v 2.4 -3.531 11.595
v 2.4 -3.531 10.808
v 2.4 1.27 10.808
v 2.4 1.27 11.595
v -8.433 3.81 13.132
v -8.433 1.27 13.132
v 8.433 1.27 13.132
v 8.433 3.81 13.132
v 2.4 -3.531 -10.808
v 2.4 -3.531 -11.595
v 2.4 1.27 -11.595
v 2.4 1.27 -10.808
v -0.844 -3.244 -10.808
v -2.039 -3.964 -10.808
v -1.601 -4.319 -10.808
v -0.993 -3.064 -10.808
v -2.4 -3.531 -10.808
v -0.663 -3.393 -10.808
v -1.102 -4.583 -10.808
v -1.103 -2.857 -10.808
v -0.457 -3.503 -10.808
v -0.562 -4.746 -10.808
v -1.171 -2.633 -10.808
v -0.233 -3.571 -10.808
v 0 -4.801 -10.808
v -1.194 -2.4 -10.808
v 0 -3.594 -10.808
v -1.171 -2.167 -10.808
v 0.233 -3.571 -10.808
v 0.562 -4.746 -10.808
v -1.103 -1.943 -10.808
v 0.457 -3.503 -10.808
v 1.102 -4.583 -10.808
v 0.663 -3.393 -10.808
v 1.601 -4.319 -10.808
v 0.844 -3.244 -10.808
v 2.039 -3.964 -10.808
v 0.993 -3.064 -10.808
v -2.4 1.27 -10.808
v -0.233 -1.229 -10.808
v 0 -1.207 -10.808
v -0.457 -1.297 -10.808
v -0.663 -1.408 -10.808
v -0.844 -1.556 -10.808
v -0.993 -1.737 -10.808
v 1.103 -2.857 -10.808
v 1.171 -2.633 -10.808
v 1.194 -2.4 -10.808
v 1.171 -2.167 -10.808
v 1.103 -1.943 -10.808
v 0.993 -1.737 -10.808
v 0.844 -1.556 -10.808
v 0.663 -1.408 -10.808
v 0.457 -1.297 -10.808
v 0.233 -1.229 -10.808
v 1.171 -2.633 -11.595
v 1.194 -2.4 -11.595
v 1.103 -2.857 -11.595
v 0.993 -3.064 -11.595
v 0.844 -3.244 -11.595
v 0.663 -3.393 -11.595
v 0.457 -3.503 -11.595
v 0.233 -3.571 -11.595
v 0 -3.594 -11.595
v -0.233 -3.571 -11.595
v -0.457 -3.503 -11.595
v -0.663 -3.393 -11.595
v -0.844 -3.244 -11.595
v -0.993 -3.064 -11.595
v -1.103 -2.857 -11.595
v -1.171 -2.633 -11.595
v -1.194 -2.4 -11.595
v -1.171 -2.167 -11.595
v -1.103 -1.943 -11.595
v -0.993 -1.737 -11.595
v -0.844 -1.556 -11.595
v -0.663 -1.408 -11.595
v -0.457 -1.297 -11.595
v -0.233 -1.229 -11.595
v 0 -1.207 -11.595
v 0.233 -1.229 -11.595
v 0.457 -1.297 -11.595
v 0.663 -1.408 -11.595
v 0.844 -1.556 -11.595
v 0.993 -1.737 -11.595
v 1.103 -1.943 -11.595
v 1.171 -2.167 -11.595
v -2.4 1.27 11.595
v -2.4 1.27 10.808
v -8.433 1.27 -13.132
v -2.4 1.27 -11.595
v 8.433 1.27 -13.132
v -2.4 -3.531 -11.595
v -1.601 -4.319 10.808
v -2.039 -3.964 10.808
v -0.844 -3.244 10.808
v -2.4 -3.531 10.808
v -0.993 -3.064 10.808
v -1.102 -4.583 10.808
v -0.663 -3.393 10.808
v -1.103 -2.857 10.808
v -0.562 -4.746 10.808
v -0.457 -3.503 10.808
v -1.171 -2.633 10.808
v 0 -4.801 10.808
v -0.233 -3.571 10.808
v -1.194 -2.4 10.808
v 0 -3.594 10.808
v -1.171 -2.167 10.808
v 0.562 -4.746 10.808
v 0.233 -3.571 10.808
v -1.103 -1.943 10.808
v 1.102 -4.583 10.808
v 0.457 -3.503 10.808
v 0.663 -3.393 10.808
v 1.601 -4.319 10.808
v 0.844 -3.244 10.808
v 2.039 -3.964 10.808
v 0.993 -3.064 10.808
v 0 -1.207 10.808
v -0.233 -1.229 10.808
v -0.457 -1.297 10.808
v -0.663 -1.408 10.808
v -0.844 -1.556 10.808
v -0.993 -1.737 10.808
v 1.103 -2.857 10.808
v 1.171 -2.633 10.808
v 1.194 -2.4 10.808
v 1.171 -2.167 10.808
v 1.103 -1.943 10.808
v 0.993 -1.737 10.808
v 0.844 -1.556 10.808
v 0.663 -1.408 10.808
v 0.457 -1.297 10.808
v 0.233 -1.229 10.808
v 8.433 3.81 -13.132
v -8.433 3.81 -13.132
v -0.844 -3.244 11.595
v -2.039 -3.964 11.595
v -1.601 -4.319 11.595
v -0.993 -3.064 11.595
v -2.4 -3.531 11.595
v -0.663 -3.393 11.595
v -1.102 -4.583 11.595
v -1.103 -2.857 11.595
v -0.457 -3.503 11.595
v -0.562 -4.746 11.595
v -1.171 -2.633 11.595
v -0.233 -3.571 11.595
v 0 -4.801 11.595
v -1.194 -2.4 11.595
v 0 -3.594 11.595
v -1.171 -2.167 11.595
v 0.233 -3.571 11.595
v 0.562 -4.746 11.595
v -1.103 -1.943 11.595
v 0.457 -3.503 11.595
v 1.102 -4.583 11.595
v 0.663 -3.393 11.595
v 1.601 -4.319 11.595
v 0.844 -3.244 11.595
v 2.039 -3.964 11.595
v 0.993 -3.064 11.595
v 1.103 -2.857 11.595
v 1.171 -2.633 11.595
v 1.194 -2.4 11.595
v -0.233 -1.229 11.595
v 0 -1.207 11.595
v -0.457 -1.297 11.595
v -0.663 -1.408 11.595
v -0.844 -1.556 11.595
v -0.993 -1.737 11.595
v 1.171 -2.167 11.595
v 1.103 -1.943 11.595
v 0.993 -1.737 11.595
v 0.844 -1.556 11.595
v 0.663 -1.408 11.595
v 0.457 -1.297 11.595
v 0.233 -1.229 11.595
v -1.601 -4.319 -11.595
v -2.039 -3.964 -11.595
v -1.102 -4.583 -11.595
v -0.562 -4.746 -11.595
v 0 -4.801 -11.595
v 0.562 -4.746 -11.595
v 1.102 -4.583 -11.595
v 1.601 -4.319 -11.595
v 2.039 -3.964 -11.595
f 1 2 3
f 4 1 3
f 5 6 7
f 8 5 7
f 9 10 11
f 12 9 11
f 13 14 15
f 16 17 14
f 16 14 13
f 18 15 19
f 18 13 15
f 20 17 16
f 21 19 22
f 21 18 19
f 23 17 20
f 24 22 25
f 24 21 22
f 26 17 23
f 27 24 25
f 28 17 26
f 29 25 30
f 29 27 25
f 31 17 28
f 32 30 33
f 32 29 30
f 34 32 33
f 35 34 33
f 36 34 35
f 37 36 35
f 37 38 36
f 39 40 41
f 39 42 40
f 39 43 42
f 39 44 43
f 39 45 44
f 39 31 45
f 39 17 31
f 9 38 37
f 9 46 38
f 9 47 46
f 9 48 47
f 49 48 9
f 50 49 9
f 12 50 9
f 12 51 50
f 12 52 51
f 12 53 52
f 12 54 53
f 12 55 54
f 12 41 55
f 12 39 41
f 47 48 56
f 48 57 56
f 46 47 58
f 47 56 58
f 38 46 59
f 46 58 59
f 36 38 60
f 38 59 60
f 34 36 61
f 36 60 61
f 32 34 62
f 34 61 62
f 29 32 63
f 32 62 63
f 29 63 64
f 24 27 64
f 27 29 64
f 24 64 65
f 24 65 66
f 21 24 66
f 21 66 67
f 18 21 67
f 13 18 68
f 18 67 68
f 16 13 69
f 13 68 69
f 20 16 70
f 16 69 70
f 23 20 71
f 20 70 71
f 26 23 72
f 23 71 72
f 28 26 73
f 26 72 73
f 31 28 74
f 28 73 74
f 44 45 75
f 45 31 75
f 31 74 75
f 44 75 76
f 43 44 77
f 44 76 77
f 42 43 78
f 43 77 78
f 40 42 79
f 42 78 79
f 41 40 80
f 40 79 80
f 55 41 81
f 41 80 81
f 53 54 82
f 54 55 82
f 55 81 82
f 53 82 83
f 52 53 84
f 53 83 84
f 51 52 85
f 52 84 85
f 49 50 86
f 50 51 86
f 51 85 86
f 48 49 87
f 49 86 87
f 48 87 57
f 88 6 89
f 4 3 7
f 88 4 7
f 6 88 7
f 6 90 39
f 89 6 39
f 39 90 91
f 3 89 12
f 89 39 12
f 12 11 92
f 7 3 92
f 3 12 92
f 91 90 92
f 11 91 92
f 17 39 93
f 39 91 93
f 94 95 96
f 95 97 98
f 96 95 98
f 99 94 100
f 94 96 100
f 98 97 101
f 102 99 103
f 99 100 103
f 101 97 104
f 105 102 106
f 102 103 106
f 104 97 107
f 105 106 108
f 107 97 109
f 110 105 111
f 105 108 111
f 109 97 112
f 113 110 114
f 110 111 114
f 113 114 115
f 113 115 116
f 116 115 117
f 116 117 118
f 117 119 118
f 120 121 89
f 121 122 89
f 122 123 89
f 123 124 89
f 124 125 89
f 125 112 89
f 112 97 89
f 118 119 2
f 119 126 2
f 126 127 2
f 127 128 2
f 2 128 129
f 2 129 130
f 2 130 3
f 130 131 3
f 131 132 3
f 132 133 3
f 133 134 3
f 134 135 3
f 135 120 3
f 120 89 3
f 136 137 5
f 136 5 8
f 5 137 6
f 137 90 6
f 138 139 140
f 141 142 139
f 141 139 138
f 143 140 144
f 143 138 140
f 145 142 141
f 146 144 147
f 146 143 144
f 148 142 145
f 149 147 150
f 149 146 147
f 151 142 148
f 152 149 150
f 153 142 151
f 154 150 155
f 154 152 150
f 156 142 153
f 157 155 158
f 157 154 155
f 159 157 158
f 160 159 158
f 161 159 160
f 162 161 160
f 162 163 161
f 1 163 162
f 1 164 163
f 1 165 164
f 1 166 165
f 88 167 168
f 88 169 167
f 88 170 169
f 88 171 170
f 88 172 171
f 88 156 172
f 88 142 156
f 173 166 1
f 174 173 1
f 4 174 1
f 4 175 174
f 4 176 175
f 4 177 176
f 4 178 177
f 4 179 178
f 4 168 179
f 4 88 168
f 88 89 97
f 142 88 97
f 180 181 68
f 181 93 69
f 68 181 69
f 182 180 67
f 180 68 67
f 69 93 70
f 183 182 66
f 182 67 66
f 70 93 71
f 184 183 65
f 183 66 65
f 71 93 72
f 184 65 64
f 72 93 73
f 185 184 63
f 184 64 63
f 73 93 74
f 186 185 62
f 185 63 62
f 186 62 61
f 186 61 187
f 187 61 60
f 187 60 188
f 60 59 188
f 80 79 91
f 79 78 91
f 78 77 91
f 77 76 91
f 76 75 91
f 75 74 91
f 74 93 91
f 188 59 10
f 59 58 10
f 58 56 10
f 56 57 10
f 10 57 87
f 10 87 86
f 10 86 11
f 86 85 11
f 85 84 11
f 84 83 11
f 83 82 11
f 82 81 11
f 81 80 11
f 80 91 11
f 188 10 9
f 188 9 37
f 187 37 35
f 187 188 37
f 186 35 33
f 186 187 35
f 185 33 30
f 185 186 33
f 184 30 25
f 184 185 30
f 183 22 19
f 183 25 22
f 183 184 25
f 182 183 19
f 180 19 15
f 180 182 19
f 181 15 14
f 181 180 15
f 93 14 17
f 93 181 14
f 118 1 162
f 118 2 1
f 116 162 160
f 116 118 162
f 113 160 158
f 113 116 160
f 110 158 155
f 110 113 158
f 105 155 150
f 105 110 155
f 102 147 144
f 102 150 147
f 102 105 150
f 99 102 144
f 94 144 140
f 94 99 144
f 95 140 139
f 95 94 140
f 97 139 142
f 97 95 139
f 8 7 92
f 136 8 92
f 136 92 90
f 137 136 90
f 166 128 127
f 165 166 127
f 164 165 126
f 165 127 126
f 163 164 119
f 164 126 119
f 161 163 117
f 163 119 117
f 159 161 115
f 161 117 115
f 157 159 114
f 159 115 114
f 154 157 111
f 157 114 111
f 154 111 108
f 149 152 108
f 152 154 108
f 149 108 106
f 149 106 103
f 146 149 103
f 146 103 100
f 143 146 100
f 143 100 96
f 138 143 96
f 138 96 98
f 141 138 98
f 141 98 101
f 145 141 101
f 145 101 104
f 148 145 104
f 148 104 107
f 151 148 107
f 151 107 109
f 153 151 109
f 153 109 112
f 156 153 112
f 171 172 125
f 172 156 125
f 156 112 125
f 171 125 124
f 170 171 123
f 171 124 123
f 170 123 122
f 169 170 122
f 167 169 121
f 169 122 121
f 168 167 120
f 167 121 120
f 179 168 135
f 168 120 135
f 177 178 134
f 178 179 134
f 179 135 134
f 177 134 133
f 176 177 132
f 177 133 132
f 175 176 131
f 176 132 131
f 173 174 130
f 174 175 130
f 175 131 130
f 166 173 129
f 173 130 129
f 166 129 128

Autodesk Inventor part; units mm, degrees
sketch "Sketch_2" plane through (0, 1.27, 0) normal (0, 1, 0) x (1, 0, 0)
  line L0 (-8.4328, -13.1318) -> (8.4328, -13.1318)
  line L1 (8.4328, -13.1318) -> (8.4328, 13.1318)
  line L2 (8.4328, 13.1318) -> (-8.4328, 13.1318)
  line L3 (-8.4328, 13.1318) -> (-8.4328, -13.1318)
extrude "Extrusion1" add sketch "Sketch_2" along normal blind 2.54
sketch "Sketch_1" plane through (0, 0, -11.2014) normal (0, 0, 1) x (1, 0, 0)
  line L0 (-2.4003, 1.27) -> (-2.4003, -3.5306)
  arc A0 (-2.4003, -3.5306) -> (2.4003, -3.5306) centre (0, -1.8973) ccw
  line L1 (2.4003, -3.5306) -> (2.4003, 1.27)
  line L2 (2.4003, 1.27) -> (-2.4003, 1.27)
  circle A1 centre (0, -2.4003) radius 1.1938
extrude "Extrusion2" add sketch "Sketch_1" along normal mid plane 0.7874
sketch "Sketch_3" plane through (0, 0, 11.2014) normal (0, 0, 1) x (1, 0, 0)
  line L0 (-2.4003, 1.27) -> (-2.4003, -3.5306)
  arc A0 (-2.4003, -3.5306) -> (2.4003, -3.5306) centre (0, -1.8973) ccw
  line L1 (2.4003, -3.5306) -> (2.4003, 1.27)
  line L2 (2.4003, 1.27) -> (-2.4003, 1.27)
  circle A1 centre (0, -2.4003) radius 1.1938
extrude "Extrusion3" add sketch "Sketch_3" along normal mid plane 0.7874
ref_plane "body_to_terminal_XY" through (0, 0, 0) normal (0, -1, 0) x (1, 0, 0)
ref_plane "body_to_terminal_YZ" through (0, 0, 0) normal (1, 0, 0) x (0, 0, 1)
ref_plane "body_to_terminal_ZX" through (0, 0, 0) normal (0, 0, 1) x (0, -1, 0)
ref_plane "wire_1_XY" through (-3.048, 0, 7.62) normal (0, 1, 0) x (1, 0, 0)
ref_plane "wire_1_YZ" through (-3.048, 0, 7.62) normal (1, 0, 0) x (0, 0, -1)
ref_plane "wire_1_ZX" through (-3.048, 0, 7.62) normal (0, 0, -1) x (0, 1, 0)
ref_plane "wire_2_XY" through (3.048, 0, 7.62) normal (0, 1, 0) x (1, 0, 0)
ref_plane "wire_2_YZ" through (3.048, 0, 7.62) normal (1, 0, 0) x (0, 0, -1)
ref_plane "wire_2_ZX" through (3.048, 0, 7.62) normal (0, 0, -1) x (0, 1, 0)
ref_plane "wire_3_XY" through (-3.048, 0, 0) normal (0, 1, 0) x (1, 0, 0)
ref_plane "wire_3_YZ" through (-3.048, 0, 0) normal (1, 0, 0) x (0, 0, -1)
ref_plane "wire_3_ZX" through (-3.048, 0, 0) normal (0, 0, -1) x (0, 1, 0)
ref_plane "wire_4_XY" through (3.048, 0, 0) normal (0, 1, 0) x (1, 0, 0)
ref_plane "wire_4_YZ" through (3.048, 0, 0) normal (1, 0, 0) x (0, 0, -1)
ref_plane "wire_4_ZX" through (3.048, 0, 0) normal (0, 0, -1) x (0, 1, 0)
ref_plane "wire_5_XY" through (-3.048, 0, -7.62) normal (0, 1, 0) x (1, 0, 0)
ref_plane "wire_5_YZ" through (-3.048, 0, -7.62) normal (1, 0, 0) x (0, 0, -1)
ref_plane "wire_5_ZX" through (-3.048, 0, -7.62) normal (0, 0, -1) x (0, 1, 0)
ref_plane "wire_6_XY" through (3.048, 0, -7.62) normal (0, 1, 0) x (1, 0, 0)
ref_plane "wire_6_YZ" through (3.048, 0, -7.62) normal (1, 0, 0) x (0, 0, -1)
ref_plane "wire_6_ZX" through (3.048, 0, -7.62) normal (0, 0, -1) x (0, 1, 0)
properties part number "WT11S_terminal"
